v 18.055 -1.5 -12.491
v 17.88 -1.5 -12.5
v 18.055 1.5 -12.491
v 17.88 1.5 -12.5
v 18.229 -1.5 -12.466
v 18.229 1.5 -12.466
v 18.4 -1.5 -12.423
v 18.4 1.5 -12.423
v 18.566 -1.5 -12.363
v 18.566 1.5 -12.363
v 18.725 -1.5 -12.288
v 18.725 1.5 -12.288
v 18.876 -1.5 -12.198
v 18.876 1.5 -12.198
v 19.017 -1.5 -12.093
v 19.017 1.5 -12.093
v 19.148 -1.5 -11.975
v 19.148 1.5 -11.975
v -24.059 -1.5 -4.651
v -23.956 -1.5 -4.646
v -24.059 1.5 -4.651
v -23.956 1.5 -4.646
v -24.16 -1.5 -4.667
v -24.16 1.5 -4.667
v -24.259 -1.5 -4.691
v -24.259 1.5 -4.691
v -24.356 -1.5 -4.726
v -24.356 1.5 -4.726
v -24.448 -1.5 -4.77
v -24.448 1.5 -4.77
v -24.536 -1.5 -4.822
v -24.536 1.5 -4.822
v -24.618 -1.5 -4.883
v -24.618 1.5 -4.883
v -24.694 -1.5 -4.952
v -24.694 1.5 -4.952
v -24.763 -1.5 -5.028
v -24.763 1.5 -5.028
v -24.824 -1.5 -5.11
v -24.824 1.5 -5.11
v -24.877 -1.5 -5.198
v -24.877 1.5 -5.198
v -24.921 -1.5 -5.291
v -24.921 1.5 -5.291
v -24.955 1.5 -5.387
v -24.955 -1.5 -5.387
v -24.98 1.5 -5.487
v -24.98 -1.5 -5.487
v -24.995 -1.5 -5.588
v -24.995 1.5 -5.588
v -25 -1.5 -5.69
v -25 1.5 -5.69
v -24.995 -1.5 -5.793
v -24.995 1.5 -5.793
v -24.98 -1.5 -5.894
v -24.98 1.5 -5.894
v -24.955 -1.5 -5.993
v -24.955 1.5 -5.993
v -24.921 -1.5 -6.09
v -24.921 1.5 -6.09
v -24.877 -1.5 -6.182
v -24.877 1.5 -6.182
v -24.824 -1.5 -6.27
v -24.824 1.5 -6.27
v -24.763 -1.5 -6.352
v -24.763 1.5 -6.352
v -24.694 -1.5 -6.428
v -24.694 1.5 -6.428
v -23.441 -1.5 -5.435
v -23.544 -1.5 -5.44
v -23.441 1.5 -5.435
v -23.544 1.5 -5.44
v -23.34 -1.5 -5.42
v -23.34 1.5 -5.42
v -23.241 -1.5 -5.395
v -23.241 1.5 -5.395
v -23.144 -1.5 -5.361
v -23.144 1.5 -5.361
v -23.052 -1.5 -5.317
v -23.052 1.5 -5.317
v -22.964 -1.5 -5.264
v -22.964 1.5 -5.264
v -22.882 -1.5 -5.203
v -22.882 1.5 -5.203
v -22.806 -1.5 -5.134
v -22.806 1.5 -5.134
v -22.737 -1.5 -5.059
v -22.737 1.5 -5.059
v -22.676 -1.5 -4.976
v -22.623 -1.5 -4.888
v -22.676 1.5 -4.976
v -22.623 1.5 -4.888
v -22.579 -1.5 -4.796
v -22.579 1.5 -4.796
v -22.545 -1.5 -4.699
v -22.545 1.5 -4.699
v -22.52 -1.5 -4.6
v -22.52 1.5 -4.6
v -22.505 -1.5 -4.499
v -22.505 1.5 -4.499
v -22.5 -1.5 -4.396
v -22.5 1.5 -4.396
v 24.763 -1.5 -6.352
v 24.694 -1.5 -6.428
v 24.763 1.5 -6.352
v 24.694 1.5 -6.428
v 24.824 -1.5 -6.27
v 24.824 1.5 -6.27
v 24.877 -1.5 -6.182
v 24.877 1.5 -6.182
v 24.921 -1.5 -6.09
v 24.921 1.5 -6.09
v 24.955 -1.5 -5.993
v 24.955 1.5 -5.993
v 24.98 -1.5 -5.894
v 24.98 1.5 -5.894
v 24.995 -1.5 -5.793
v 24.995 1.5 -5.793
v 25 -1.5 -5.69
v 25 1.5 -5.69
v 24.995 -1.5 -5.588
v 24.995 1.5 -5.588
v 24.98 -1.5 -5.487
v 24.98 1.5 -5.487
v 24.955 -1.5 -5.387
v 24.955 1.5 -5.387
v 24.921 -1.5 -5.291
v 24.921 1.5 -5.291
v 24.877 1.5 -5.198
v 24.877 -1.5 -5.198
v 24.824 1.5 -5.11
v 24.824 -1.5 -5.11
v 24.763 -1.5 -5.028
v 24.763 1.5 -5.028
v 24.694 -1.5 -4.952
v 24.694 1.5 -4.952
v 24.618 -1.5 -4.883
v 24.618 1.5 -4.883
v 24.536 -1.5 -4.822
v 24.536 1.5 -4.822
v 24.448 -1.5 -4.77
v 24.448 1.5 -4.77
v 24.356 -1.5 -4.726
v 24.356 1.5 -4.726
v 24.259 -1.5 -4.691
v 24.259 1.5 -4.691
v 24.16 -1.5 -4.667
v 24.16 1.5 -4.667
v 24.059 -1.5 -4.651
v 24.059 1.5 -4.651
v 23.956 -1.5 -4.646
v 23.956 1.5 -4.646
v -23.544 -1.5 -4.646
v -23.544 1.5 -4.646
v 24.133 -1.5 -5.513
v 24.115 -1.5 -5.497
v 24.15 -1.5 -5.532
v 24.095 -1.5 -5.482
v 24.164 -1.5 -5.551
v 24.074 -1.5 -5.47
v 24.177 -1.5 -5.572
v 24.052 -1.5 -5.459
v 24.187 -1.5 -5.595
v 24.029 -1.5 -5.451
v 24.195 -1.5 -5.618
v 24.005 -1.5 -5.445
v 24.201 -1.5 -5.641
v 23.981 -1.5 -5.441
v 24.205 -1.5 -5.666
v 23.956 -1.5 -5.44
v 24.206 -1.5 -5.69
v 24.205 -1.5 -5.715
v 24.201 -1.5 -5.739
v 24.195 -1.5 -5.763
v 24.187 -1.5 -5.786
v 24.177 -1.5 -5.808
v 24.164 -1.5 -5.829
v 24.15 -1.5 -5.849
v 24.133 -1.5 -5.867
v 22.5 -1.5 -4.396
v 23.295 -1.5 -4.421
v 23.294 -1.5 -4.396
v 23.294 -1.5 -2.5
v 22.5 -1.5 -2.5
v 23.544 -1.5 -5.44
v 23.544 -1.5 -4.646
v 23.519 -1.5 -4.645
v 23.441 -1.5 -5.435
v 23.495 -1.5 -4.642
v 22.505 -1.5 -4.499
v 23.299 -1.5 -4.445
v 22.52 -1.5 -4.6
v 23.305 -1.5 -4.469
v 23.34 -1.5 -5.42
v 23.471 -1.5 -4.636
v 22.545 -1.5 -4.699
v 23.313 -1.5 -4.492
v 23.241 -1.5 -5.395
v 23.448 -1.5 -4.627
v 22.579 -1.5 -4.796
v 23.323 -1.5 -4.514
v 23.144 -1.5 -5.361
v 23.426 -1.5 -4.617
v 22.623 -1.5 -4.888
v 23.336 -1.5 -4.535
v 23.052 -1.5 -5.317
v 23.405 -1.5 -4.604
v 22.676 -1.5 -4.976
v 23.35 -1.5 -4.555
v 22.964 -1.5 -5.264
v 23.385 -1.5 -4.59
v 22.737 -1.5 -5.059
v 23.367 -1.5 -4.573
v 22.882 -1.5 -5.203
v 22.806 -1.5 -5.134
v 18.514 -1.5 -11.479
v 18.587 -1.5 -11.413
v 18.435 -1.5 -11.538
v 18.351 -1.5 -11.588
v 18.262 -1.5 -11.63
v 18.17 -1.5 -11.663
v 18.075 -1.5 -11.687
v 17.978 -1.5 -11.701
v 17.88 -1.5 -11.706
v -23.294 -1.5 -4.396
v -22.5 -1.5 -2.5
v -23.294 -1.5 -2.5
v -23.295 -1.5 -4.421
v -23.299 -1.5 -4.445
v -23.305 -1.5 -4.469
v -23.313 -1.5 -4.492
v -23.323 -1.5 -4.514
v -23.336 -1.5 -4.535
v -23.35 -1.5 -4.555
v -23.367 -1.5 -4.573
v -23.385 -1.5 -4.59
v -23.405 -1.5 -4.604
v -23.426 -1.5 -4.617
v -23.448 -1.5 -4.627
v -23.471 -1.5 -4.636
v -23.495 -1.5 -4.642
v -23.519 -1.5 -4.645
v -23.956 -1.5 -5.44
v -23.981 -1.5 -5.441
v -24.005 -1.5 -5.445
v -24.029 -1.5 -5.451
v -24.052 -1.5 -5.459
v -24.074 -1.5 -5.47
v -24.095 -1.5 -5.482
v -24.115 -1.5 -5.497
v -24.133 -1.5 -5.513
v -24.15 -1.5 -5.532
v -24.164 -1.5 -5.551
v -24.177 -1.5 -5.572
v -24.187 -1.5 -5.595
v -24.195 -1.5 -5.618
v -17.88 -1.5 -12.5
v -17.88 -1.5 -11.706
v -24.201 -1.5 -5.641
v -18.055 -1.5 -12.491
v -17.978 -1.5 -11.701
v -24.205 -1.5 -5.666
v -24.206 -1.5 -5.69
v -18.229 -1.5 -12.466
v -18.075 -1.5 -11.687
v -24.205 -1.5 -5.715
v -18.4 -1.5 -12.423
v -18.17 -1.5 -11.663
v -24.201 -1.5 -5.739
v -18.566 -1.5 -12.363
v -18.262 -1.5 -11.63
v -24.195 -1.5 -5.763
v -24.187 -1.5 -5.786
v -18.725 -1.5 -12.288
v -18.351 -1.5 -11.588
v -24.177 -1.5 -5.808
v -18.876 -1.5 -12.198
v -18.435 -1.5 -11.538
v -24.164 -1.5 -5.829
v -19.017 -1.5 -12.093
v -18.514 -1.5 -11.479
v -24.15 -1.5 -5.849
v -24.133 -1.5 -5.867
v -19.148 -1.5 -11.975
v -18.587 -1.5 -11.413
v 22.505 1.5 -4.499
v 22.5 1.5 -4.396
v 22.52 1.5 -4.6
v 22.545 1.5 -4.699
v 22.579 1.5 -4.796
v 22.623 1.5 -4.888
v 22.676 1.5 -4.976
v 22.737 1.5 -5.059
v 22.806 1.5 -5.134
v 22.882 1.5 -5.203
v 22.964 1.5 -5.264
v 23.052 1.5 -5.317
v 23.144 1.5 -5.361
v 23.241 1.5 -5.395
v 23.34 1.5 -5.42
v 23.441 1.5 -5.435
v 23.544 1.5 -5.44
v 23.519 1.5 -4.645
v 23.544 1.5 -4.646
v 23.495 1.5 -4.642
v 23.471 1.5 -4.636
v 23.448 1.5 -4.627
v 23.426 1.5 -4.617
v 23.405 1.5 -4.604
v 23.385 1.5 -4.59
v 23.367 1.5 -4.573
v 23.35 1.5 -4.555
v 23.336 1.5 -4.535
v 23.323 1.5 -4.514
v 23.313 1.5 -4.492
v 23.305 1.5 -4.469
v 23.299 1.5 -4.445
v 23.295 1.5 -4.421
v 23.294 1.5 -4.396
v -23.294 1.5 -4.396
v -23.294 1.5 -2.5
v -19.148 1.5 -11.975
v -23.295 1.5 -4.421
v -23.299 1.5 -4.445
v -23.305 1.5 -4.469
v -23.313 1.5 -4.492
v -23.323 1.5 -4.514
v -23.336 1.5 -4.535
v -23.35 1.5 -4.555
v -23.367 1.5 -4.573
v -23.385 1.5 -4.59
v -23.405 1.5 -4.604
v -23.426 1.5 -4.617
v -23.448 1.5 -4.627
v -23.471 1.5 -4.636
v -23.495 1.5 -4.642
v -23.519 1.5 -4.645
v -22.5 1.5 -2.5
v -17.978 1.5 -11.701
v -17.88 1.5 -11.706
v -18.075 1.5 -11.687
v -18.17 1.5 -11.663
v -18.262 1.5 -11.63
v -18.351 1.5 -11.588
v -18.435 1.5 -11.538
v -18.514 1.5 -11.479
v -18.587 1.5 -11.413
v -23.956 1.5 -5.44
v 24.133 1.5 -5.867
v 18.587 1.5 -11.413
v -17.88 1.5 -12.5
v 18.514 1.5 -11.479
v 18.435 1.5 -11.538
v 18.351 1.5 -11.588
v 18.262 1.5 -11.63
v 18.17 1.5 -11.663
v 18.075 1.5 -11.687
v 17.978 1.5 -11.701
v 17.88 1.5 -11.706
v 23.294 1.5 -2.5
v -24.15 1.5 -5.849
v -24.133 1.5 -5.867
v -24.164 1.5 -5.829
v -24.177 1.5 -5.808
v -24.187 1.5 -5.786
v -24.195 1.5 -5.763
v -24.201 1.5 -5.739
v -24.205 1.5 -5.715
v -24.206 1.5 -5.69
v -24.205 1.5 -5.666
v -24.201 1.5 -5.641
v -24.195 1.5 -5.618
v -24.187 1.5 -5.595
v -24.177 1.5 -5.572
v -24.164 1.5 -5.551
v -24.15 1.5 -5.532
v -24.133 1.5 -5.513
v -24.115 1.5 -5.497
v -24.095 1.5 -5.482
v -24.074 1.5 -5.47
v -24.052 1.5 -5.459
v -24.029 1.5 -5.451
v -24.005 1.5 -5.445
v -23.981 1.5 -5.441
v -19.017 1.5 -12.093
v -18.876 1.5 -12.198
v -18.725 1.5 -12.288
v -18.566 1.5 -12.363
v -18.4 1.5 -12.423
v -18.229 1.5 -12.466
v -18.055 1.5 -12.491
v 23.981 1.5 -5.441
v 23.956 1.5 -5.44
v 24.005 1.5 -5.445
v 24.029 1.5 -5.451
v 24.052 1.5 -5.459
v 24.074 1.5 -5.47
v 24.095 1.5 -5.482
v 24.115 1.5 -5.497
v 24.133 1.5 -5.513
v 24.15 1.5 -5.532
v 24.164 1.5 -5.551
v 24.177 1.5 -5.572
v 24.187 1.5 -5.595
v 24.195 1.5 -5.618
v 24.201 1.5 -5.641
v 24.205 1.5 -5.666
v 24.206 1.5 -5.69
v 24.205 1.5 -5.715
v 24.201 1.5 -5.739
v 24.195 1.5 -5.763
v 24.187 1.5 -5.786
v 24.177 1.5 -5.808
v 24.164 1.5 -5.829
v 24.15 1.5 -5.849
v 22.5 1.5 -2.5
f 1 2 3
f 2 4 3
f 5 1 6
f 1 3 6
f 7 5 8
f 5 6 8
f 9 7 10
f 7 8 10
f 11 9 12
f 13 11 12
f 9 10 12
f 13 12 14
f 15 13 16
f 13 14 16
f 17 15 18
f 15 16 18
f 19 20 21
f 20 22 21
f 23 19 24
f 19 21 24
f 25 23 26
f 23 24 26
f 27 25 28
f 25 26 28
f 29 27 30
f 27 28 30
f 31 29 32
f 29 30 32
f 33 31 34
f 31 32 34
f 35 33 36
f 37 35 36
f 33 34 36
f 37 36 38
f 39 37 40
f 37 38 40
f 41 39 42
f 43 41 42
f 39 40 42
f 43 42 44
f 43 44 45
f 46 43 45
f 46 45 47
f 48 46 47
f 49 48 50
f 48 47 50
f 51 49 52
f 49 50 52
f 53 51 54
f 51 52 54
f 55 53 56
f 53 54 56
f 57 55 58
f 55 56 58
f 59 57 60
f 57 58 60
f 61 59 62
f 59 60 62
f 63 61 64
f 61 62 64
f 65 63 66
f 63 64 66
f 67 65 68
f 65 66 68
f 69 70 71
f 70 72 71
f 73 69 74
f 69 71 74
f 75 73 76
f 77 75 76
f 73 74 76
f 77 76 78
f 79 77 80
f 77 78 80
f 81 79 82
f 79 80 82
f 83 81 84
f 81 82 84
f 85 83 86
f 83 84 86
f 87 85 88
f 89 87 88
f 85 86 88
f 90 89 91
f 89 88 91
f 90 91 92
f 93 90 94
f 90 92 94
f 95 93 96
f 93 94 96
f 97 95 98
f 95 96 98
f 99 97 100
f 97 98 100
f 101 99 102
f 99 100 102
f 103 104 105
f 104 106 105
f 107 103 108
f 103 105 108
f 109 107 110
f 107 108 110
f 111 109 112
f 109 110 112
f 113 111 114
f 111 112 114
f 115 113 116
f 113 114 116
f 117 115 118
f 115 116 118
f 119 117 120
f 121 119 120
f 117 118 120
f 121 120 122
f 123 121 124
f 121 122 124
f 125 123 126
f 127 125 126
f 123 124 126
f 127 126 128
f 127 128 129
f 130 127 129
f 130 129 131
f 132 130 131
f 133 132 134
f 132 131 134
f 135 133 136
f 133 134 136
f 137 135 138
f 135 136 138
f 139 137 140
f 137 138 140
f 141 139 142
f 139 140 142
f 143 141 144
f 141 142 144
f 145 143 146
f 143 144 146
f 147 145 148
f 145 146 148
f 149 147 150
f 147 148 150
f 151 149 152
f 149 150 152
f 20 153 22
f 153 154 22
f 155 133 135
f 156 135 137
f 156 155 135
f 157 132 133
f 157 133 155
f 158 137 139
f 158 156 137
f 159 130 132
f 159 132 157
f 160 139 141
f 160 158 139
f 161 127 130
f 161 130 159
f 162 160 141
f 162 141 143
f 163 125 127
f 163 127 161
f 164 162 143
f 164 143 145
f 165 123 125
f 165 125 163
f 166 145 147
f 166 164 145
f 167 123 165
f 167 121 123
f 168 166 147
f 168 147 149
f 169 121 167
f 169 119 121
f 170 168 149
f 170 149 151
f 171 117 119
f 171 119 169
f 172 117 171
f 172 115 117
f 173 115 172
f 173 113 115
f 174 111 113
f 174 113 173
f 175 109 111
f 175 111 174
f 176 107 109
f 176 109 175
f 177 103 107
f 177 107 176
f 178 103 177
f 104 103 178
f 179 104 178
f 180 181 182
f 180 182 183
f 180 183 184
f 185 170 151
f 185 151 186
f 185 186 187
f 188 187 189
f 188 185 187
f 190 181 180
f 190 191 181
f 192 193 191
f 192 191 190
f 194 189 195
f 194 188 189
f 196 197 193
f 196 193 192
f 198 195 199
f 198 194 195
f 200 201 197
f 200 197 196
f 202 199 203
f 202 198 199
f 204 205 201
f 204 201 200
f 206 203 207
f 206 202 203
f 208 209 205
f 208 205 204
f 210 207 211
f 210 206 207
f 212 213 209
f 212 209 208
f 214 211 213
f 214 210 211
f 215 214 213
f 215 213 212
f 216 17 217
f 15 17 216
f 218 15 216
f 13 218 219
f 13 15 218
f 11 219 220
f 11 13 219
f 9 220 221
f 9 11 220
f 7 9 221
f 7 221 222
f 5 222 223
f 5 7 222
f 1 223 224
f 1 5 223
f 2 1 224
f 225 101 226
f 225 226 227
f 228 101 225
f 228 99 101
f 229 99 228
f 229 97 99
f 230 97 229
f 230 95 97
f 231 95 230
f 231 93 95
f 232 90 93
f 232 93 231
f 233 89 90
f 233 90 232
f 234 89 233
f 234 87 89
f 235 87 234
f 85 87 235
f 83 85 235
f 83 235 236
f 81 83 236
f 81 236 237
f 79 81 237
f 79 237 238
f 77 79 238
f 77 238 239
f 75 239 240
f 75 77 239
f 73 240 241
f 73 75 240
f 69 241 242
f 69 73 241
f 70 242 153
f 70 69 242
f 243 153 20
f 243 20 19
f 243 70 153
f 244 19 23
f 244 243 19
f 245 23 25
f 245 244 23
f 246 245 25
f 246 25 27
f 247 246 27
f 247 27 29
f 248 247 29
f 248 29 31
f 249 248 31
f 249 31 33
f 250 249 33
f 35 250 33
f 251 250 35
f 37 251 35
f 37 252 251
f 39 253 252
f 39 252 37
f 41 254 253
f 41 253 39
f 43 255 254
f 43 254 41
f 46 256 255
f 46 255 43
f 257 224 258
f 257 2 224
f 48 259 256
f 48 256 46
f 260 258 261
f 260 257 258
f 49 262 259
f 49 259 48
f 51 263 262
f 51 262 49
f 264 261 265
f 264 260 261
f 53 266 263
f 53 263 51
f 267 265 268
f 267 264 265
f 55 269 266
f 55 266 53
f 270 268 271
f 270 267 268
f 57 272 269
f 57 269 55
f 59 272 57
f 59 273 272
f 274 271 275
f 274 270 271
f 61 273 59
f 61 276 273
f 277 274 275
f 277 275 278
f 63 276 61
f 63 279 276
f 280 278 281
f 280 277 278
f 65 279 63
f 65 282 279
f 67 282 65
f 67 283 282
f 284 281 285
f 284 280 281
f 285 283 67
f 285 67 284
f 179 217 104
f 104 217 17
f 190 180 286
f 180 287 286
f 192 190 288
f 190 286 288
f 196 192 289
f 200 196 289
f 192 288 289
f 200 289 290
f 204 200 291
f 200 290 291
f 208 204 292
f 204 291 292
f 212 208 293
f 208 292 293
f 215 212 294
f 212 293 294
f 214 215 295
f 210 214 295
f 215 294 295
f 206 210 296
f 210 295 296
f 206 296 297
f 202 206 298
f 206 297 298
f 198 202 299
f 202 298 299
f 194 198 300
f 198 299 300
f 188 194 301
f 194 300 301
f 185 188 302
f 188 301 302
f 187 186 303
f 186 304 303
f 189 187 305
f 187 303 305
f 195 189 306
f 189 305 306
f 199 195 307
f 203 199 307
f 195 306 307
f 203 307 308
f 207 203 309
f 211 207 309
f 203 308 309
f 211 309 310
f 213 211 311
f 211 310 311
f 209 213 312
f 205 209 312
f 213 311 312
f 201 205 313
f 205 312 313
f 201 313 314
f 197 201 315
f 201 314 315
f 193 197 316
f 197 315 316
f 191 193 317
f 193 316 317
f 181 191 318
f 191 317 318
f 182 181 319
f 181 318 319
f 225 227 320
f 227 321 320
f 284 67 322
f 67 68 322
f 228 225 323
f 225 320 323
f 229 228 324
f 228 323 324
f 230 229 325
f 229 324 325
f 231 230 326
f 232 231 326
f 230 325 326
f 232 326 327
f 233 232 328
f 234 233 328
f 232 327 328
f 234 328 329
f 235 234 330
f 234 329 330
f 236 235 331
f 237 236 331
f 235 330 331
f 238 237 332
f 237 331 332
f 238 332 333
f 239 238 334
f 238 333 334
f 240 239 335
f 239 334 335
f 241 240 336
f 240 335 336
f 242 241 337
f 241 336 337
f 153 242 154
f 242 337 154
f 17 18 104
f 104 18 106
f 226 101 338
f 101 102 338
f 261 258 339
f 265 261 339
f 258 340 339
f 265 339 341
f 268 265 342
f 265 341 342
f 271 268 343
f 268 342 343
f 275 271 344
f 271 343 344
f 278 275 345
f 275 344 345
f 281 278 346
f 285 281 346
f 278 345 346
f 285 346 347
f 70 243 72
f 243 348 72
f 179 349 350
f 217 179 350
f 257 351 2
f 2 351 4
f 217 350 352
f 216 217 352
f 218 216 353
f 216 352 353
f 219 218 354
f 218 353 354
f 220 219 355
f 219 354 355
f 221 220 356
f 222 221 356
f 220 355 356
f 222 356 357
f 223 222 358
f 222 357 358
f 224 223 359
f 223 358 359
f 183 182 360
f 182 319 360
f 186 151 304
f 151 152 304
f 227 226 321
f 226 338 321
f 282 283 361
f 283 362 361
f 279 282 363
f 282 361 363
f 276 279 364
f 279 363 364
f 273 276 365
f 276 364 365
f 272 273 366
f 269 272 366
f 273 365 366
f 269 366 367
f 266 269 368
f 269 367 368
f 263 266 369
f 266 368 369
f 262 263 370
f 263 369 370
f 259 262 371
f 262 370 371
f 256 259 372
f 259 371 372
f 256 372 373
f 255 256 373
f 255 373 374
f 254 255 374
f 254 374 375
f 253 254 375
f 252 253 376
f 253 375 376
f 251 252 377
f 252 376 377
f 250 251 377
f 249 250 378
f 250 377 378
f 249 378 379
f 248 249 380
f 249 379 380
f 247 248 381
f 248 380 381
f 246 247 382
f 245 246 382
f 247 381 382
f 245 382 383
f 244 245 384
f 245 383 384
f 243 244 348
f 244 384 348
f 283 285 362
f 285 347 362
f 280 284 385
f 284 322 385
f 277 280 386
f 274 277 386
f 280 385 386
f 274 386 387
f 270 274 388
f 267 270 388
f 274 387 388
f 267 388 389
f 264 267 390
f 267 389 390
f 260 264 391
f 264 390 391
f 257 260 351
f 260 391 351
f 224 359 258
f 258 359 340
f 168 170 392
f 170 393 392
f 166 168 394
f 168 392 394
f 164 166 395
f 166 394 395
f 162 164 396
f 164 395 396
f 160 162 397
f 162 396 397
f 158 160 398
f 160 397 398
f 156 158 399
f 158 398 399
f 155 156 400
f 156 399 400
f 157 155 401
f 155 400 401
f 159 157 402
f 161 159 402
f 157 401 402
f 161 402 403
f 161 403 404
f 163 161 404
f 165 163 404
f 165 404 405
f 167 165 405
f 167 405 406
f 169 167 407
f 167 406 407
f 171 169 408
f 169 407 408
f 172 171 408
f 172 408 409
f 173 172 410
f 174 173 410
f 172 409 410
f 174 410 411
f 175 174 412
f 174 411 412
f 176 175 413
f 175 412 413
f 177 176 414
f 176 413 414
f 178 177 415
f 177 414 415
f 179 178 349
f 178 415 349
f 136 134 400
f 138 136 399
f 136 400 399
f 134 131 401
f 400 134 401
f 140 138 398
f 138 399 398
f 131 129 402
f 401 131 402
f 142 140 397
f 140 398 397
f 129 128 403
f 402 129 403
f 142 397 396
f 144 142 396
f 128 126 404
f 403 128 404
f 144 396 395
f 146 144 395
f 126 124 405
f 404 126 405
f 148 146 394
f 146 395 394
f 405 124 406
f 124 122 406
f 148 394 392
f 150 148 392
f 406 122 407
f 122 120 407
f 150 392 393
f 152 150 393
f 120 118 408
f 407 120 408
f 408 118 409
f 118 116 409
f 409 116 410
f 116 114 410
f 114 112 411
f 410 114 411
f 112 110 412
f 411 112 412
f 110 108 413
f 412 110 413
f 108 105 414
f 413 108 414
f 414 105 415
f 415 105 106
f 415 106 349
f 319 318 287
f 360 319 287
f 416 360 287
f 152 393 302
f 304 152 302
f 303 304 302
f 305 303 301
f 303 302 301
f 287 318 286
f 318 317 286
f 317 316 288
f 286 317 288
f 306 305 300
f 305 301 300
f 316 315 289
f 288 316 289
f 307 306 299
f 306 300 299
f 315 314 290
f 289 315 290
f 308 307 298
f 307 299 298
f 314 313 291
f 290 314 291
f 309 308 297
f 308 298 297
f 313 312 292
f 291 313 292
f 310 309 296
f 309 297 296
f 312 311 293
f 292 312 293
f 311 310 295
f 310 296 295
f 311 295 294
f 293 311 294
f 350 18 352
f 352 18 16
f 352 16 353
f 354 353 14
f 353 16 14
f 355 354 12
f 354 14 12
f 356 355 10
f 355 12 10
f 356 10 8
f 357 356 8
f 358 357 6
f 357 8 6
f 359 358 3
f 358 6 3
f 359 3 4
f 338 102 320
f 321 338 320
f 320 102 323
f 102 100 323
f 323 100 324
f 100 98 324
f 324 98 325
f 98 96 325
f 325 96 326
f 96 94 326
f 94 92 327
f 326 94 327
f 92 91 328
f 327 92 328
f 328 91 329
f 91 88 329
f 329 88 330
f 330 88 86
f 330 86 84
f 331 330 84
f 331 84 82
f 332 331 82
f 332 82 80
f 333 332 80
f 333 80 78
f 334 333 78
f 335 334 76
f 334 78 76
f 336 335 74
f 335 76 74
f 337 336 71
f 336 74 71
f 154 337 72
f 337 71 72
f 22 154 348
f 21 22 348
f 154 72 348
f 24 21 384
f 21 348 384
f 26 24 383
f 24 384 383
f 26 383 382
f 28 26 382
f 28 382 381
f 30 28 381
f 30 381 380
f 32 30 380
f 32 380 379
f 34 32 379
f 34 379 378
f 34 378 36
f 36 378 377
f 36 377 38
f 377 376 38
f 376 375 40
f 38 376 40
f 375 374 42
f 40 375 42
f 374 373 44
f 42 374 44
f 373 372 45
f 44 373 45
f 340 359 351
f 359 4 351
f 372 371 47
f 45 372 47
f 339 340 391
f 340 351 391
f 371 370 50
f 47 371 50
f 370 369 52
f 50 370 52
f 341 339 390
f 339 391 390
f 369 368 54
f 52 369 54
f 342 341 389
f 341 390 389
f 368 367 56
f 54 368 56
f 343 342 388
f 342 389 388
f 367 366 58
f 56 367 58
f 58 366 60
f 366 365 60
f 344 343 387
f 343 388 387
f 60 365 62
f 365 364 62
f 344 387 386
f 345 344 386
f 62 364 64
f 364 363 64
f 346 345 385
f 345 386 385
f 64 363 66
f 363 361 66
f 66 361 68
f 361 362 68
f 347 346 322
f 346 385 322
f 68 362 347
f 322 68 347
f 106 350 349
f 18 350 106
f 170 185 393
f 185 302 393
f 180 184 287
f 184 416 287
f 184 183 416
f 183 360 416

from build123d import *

# Parameters (mm, degrees)
BOSS_EXTRUDE1_DEPTH = 1.5


with BuildPart() as part:
    # Sketch1 → Boss-Extrude1 (new, symmetric)
    with BuildSketch(Plane(origin=(0, 0, 0), x_dir=(1, 0, 0), z_dir=(0, 1, 0))):
        with BuildLine():
            Line((17.879536438, 11.70625), (-17.879536438, 11.70625))
            ThreePointArc((-17.879536438, 11.70625), (-18.26221987, 11.630129533), (-18.586643219, 11.413356781))
            Line((-18.586643219, 11.413356781), (-24.133026695, 5.866973305))
            ThreePointArc((-24.133026695, 5.866973305), (-24.187219883, 5.594525751), (-23.95625, 5.440196609))
            Line((-23.95625, 5.440196609), (-23.54375, 5.440196609))
            ThreePointArc((-23.54375, 5.440196609), (-22.805707297, 5.134489312), (-22.5, 4.396446609))
            Line((-22.5, 4.396446609), (-22.5, 2.5))
            Line((-22.5, 2.5), (-23.29375, 2.5))
            Line((-23.29375, 2.5), (-23.29375, 4.396446609))
            ThreePointArc((-23.29375, 4.396446609), (-23.366973305, 4.573223305), (-23.54375, 4.646446609))
            Line((-23.54375, 4.646446609), (-23.95625, 4.646446609))
            ThreePointArc((-23.95625, 4.646446609), (-24.920549262, 5.290770777), (-24.694292703, 6.428239312))
            Line((-24.694292703, 6.428239312), (-19.147909226, 11.974622789))
            ThreePointArc((-19.147909226, 11.974622789), (-18.565974844, 12.363458911), (-17.879536438, 12.5))
            Line((-17.879536438, 12.5), (17.879536438, 12.5))
            ThreePointArc((17.879536438, 12.5), (18.565974844, 12.363458911), (19.147909226, 11.974622789))
            Line((19.147909226, 11.974622789), (24.694292703, 6.428239312))
            ThreePointArc((24.694292703, 6.428239312), (24.920549262, 5.290770777), (23.95625, 4.646446609))
            Line((23.95625, 4.646446609), (23.54375, 4.646446609))
            ThreePointArc((23.54375, 4.646446609), (23.366973305, 4.573223305), (23.29375, 4.396446609))
            Line((23.29375, 4.396446609), (23.29375, 2.5))
            Line((23.29375, 2.5), (22.5, 2.5))
            Line((22.5, 2.5), (22.5, 4.396446609))
            ThreePointArc((22.5, 4.396446609), (22.805707297, 5.134489312), (23.54375, 5.440196609))
            Line((23.54375, 5.440196609), (23.95625, 5.440196609))
            ThreePointArc((23.95625, 5.440196609), (24.187219883, 5.594525751), (24.133026695, 5.866973305))
            Line((24.133026695, 5.866973305), (18.586643219, 11.413356781))
            ThreePointArc((18.586643219, 11.413356781), (18.26221987, 11.630129533), (17.879536438, 11.70625))
        make_face()
    extrude(amount=BOSS_EXTRUDE1_DEPTH, both=True)


solid = part.part
